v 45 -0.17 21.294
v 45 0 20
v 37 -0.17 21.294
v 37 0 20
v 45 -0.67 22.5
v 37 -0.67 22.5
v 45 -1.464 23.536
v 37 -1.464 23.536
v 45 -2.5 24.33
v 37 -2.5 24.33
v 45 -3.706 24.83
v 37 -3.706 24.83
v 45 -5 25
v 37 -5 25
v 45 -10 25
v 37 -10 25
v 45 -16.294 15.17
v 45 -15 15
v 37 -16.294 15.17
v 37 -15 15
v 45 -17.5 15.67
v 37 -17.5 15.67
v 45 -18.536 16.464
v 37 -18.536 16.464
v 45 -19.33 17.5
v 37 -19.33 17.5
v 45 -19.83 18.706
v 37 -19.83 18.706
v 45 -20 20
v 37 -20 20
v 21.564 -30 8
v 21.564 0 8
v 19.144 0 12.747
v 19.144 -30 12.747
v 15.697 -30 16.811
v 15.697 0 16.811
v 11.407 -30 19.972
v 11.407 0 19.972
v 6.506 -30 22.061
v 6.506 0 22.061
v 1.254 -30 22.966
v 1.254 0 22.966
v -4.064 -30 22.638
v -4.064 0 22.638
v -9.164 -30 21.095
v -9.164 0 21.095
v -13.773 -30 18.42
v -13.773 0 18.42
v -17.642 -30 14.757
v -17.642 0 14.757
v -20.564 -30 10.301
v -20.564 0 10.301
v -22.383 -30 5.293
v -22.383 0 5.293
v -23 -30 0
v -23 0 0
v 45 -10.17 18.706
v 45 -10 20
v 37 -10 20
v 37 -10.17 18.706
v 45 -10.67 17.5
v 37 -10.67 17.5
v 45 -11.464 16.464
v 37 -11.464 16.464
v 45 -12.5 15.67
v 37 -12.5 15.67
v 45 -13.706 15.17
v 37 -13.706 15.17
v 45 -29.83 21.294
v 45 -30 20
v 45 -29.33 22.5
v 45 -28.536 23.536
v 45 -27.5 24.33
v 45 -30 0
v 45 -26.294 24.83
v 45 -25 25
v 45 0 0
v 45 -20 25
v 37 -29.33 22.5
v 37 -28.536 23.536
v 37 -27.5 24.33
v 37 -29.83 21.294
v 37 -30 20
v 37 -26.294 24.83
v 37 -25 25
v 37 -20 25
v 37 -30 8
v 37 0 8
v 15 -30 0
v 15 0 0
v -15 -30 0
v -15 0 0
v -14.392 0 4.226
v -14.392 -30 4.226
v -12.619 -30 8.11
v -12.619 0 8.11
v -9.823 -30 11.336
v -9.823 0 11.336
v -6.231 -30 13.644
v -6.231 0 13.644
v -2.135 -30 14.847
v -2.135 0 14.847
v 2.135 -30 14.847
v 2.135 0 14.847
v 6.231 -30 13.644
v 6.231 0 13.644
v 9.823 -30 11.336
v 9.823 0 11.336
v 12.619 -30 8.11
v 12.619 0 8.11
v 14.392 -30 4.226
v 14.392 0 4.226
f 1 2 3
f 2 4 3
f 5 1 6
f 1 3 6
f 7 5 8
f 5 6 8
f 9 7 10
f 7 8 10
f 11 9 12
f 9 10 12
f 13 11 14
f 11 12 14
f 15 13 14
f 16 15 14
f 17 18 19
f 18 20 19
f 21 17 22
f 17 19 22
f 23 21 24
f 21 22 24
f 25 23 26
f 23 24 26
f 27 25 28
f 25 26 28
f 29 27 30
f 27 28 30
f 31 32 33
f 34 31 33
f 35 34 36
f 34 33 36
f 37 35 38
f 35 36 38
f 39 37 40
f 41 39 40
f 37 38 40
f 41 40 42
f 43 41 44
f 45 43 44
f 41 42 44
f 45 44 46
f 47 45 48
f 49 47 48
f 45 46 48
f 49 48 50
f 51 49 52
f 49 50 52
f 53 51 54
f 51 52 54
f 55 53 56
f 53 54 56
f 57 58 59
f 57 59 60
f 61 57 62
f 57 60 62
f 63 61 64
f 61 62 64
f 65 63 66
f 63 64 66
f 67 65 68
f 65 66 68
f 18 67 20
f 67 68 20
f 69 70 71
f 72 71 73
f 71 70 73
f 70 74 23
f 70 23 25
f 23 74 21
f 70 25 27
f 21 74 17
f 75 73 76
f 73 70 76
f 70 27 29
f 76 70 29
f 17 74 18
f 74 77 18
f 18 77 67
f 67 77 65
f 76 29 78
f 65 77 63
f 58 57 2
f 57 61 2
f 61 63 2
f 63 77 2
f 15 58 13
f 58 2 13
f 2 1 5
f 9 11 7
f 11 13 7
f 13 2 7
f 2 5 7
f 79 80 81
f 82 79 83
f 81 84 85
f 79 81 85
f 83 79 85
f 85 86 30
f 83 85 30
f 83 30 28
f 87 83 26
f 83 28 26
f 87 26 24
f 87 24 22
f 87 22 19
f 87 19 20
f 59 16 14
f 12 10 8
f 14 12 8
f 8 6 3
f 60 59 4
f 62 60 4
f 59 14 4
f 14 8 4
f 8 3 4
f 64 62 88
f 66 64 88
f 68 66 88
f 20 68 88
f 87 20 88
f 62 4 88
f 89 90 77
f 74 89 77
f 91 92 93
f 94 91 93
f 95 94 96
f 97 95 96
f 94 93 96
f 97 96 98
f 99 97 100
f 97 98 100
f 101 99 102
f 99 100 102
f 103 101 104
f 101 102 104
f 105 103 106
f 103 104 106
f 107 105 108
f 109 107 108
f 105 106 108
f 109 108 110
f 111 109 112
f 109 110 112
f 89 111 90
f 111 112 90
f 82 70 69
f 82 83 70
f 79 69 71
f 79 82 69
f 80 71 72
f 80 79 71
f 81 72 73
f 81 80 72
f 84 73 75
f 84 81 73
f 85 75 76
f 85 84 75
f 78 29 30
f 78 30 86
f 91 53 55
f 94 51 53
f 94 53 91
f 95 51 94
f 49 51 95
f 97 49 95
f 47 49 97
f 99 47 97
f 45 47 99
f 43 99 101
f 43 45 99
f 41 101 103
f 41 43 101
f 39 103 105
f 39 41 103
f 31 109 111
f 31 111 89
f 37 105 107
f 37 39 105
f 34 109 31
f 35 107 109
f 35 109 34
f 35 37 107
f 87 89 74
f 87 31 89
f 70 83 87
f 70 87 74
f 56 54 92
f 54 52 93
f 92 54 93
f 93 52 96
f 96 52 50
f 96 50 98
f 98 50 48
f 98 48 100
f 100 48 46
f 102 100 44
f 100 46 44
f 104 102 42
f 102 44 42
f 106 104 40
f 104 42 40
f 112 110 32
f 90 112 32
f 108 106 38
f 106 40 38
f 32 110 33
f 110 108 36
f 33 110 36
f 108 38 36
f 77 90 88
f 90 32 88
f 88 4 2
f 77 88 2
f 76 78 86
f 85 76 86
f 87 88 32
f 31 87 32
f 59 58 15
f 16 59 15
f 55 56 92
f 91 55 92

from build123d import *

# Parameters (mm, degrees)
F1_DEPTH = 30
F2_W     = 10
F2_H     = 10
F3_DEPTH = 8
F4_R     = 4.99999


# Not quite as in the source:
# - a fillet or chamfer is up to 0.001 mm smaller than in the source, because OpenCascade refuses the exact size


with BuildPart() as f1:
    # F0 (on Front) → F1 (new body)
    with BuildSketch(Plane.XZ):
        with BuildLine():
            ThreePointArc((-15, 0), (0, 15), (15, 0))
            Line((15, 0), (45, 0))
            Line((45, 0), (45, 25))
            Line((45, 25), (37, 25))
            Line((37, 25), (37, 8))
            Line((37, 8), (21.5638586528, 8))
            ThreePointArc((21.5638586528, 8), (-4.0639421123, 22.6381177333), (-23, 0))
            Line((-23, 0), (-15, 0))
        make_face()
    extrude(amount=F1_DEPTH)

    # F2 (on face) → F3 (cut, through all)
    with BuildSketch(Plane.YZ.offset(45)):
        with Locations((-15, 20)):
            Rectangle(F2_W, F2_H)
    extrude(amount=-F3_DEPTH, mode=Mode.SUBTRACT)

    # F4 (radius 5 in the source; OpenCascade refuses exactly that, so slightly less here)
    f4_edges = [f1.edges().sort_by_distance(p)[0] for p in [
        (41, -30, 25),
        (41, 0, 25),
        (41, -10, 15),
        (41, -20, 15),
    ]]
    fillet(f4_edges, radius=F4_R)


solid = f1.part
